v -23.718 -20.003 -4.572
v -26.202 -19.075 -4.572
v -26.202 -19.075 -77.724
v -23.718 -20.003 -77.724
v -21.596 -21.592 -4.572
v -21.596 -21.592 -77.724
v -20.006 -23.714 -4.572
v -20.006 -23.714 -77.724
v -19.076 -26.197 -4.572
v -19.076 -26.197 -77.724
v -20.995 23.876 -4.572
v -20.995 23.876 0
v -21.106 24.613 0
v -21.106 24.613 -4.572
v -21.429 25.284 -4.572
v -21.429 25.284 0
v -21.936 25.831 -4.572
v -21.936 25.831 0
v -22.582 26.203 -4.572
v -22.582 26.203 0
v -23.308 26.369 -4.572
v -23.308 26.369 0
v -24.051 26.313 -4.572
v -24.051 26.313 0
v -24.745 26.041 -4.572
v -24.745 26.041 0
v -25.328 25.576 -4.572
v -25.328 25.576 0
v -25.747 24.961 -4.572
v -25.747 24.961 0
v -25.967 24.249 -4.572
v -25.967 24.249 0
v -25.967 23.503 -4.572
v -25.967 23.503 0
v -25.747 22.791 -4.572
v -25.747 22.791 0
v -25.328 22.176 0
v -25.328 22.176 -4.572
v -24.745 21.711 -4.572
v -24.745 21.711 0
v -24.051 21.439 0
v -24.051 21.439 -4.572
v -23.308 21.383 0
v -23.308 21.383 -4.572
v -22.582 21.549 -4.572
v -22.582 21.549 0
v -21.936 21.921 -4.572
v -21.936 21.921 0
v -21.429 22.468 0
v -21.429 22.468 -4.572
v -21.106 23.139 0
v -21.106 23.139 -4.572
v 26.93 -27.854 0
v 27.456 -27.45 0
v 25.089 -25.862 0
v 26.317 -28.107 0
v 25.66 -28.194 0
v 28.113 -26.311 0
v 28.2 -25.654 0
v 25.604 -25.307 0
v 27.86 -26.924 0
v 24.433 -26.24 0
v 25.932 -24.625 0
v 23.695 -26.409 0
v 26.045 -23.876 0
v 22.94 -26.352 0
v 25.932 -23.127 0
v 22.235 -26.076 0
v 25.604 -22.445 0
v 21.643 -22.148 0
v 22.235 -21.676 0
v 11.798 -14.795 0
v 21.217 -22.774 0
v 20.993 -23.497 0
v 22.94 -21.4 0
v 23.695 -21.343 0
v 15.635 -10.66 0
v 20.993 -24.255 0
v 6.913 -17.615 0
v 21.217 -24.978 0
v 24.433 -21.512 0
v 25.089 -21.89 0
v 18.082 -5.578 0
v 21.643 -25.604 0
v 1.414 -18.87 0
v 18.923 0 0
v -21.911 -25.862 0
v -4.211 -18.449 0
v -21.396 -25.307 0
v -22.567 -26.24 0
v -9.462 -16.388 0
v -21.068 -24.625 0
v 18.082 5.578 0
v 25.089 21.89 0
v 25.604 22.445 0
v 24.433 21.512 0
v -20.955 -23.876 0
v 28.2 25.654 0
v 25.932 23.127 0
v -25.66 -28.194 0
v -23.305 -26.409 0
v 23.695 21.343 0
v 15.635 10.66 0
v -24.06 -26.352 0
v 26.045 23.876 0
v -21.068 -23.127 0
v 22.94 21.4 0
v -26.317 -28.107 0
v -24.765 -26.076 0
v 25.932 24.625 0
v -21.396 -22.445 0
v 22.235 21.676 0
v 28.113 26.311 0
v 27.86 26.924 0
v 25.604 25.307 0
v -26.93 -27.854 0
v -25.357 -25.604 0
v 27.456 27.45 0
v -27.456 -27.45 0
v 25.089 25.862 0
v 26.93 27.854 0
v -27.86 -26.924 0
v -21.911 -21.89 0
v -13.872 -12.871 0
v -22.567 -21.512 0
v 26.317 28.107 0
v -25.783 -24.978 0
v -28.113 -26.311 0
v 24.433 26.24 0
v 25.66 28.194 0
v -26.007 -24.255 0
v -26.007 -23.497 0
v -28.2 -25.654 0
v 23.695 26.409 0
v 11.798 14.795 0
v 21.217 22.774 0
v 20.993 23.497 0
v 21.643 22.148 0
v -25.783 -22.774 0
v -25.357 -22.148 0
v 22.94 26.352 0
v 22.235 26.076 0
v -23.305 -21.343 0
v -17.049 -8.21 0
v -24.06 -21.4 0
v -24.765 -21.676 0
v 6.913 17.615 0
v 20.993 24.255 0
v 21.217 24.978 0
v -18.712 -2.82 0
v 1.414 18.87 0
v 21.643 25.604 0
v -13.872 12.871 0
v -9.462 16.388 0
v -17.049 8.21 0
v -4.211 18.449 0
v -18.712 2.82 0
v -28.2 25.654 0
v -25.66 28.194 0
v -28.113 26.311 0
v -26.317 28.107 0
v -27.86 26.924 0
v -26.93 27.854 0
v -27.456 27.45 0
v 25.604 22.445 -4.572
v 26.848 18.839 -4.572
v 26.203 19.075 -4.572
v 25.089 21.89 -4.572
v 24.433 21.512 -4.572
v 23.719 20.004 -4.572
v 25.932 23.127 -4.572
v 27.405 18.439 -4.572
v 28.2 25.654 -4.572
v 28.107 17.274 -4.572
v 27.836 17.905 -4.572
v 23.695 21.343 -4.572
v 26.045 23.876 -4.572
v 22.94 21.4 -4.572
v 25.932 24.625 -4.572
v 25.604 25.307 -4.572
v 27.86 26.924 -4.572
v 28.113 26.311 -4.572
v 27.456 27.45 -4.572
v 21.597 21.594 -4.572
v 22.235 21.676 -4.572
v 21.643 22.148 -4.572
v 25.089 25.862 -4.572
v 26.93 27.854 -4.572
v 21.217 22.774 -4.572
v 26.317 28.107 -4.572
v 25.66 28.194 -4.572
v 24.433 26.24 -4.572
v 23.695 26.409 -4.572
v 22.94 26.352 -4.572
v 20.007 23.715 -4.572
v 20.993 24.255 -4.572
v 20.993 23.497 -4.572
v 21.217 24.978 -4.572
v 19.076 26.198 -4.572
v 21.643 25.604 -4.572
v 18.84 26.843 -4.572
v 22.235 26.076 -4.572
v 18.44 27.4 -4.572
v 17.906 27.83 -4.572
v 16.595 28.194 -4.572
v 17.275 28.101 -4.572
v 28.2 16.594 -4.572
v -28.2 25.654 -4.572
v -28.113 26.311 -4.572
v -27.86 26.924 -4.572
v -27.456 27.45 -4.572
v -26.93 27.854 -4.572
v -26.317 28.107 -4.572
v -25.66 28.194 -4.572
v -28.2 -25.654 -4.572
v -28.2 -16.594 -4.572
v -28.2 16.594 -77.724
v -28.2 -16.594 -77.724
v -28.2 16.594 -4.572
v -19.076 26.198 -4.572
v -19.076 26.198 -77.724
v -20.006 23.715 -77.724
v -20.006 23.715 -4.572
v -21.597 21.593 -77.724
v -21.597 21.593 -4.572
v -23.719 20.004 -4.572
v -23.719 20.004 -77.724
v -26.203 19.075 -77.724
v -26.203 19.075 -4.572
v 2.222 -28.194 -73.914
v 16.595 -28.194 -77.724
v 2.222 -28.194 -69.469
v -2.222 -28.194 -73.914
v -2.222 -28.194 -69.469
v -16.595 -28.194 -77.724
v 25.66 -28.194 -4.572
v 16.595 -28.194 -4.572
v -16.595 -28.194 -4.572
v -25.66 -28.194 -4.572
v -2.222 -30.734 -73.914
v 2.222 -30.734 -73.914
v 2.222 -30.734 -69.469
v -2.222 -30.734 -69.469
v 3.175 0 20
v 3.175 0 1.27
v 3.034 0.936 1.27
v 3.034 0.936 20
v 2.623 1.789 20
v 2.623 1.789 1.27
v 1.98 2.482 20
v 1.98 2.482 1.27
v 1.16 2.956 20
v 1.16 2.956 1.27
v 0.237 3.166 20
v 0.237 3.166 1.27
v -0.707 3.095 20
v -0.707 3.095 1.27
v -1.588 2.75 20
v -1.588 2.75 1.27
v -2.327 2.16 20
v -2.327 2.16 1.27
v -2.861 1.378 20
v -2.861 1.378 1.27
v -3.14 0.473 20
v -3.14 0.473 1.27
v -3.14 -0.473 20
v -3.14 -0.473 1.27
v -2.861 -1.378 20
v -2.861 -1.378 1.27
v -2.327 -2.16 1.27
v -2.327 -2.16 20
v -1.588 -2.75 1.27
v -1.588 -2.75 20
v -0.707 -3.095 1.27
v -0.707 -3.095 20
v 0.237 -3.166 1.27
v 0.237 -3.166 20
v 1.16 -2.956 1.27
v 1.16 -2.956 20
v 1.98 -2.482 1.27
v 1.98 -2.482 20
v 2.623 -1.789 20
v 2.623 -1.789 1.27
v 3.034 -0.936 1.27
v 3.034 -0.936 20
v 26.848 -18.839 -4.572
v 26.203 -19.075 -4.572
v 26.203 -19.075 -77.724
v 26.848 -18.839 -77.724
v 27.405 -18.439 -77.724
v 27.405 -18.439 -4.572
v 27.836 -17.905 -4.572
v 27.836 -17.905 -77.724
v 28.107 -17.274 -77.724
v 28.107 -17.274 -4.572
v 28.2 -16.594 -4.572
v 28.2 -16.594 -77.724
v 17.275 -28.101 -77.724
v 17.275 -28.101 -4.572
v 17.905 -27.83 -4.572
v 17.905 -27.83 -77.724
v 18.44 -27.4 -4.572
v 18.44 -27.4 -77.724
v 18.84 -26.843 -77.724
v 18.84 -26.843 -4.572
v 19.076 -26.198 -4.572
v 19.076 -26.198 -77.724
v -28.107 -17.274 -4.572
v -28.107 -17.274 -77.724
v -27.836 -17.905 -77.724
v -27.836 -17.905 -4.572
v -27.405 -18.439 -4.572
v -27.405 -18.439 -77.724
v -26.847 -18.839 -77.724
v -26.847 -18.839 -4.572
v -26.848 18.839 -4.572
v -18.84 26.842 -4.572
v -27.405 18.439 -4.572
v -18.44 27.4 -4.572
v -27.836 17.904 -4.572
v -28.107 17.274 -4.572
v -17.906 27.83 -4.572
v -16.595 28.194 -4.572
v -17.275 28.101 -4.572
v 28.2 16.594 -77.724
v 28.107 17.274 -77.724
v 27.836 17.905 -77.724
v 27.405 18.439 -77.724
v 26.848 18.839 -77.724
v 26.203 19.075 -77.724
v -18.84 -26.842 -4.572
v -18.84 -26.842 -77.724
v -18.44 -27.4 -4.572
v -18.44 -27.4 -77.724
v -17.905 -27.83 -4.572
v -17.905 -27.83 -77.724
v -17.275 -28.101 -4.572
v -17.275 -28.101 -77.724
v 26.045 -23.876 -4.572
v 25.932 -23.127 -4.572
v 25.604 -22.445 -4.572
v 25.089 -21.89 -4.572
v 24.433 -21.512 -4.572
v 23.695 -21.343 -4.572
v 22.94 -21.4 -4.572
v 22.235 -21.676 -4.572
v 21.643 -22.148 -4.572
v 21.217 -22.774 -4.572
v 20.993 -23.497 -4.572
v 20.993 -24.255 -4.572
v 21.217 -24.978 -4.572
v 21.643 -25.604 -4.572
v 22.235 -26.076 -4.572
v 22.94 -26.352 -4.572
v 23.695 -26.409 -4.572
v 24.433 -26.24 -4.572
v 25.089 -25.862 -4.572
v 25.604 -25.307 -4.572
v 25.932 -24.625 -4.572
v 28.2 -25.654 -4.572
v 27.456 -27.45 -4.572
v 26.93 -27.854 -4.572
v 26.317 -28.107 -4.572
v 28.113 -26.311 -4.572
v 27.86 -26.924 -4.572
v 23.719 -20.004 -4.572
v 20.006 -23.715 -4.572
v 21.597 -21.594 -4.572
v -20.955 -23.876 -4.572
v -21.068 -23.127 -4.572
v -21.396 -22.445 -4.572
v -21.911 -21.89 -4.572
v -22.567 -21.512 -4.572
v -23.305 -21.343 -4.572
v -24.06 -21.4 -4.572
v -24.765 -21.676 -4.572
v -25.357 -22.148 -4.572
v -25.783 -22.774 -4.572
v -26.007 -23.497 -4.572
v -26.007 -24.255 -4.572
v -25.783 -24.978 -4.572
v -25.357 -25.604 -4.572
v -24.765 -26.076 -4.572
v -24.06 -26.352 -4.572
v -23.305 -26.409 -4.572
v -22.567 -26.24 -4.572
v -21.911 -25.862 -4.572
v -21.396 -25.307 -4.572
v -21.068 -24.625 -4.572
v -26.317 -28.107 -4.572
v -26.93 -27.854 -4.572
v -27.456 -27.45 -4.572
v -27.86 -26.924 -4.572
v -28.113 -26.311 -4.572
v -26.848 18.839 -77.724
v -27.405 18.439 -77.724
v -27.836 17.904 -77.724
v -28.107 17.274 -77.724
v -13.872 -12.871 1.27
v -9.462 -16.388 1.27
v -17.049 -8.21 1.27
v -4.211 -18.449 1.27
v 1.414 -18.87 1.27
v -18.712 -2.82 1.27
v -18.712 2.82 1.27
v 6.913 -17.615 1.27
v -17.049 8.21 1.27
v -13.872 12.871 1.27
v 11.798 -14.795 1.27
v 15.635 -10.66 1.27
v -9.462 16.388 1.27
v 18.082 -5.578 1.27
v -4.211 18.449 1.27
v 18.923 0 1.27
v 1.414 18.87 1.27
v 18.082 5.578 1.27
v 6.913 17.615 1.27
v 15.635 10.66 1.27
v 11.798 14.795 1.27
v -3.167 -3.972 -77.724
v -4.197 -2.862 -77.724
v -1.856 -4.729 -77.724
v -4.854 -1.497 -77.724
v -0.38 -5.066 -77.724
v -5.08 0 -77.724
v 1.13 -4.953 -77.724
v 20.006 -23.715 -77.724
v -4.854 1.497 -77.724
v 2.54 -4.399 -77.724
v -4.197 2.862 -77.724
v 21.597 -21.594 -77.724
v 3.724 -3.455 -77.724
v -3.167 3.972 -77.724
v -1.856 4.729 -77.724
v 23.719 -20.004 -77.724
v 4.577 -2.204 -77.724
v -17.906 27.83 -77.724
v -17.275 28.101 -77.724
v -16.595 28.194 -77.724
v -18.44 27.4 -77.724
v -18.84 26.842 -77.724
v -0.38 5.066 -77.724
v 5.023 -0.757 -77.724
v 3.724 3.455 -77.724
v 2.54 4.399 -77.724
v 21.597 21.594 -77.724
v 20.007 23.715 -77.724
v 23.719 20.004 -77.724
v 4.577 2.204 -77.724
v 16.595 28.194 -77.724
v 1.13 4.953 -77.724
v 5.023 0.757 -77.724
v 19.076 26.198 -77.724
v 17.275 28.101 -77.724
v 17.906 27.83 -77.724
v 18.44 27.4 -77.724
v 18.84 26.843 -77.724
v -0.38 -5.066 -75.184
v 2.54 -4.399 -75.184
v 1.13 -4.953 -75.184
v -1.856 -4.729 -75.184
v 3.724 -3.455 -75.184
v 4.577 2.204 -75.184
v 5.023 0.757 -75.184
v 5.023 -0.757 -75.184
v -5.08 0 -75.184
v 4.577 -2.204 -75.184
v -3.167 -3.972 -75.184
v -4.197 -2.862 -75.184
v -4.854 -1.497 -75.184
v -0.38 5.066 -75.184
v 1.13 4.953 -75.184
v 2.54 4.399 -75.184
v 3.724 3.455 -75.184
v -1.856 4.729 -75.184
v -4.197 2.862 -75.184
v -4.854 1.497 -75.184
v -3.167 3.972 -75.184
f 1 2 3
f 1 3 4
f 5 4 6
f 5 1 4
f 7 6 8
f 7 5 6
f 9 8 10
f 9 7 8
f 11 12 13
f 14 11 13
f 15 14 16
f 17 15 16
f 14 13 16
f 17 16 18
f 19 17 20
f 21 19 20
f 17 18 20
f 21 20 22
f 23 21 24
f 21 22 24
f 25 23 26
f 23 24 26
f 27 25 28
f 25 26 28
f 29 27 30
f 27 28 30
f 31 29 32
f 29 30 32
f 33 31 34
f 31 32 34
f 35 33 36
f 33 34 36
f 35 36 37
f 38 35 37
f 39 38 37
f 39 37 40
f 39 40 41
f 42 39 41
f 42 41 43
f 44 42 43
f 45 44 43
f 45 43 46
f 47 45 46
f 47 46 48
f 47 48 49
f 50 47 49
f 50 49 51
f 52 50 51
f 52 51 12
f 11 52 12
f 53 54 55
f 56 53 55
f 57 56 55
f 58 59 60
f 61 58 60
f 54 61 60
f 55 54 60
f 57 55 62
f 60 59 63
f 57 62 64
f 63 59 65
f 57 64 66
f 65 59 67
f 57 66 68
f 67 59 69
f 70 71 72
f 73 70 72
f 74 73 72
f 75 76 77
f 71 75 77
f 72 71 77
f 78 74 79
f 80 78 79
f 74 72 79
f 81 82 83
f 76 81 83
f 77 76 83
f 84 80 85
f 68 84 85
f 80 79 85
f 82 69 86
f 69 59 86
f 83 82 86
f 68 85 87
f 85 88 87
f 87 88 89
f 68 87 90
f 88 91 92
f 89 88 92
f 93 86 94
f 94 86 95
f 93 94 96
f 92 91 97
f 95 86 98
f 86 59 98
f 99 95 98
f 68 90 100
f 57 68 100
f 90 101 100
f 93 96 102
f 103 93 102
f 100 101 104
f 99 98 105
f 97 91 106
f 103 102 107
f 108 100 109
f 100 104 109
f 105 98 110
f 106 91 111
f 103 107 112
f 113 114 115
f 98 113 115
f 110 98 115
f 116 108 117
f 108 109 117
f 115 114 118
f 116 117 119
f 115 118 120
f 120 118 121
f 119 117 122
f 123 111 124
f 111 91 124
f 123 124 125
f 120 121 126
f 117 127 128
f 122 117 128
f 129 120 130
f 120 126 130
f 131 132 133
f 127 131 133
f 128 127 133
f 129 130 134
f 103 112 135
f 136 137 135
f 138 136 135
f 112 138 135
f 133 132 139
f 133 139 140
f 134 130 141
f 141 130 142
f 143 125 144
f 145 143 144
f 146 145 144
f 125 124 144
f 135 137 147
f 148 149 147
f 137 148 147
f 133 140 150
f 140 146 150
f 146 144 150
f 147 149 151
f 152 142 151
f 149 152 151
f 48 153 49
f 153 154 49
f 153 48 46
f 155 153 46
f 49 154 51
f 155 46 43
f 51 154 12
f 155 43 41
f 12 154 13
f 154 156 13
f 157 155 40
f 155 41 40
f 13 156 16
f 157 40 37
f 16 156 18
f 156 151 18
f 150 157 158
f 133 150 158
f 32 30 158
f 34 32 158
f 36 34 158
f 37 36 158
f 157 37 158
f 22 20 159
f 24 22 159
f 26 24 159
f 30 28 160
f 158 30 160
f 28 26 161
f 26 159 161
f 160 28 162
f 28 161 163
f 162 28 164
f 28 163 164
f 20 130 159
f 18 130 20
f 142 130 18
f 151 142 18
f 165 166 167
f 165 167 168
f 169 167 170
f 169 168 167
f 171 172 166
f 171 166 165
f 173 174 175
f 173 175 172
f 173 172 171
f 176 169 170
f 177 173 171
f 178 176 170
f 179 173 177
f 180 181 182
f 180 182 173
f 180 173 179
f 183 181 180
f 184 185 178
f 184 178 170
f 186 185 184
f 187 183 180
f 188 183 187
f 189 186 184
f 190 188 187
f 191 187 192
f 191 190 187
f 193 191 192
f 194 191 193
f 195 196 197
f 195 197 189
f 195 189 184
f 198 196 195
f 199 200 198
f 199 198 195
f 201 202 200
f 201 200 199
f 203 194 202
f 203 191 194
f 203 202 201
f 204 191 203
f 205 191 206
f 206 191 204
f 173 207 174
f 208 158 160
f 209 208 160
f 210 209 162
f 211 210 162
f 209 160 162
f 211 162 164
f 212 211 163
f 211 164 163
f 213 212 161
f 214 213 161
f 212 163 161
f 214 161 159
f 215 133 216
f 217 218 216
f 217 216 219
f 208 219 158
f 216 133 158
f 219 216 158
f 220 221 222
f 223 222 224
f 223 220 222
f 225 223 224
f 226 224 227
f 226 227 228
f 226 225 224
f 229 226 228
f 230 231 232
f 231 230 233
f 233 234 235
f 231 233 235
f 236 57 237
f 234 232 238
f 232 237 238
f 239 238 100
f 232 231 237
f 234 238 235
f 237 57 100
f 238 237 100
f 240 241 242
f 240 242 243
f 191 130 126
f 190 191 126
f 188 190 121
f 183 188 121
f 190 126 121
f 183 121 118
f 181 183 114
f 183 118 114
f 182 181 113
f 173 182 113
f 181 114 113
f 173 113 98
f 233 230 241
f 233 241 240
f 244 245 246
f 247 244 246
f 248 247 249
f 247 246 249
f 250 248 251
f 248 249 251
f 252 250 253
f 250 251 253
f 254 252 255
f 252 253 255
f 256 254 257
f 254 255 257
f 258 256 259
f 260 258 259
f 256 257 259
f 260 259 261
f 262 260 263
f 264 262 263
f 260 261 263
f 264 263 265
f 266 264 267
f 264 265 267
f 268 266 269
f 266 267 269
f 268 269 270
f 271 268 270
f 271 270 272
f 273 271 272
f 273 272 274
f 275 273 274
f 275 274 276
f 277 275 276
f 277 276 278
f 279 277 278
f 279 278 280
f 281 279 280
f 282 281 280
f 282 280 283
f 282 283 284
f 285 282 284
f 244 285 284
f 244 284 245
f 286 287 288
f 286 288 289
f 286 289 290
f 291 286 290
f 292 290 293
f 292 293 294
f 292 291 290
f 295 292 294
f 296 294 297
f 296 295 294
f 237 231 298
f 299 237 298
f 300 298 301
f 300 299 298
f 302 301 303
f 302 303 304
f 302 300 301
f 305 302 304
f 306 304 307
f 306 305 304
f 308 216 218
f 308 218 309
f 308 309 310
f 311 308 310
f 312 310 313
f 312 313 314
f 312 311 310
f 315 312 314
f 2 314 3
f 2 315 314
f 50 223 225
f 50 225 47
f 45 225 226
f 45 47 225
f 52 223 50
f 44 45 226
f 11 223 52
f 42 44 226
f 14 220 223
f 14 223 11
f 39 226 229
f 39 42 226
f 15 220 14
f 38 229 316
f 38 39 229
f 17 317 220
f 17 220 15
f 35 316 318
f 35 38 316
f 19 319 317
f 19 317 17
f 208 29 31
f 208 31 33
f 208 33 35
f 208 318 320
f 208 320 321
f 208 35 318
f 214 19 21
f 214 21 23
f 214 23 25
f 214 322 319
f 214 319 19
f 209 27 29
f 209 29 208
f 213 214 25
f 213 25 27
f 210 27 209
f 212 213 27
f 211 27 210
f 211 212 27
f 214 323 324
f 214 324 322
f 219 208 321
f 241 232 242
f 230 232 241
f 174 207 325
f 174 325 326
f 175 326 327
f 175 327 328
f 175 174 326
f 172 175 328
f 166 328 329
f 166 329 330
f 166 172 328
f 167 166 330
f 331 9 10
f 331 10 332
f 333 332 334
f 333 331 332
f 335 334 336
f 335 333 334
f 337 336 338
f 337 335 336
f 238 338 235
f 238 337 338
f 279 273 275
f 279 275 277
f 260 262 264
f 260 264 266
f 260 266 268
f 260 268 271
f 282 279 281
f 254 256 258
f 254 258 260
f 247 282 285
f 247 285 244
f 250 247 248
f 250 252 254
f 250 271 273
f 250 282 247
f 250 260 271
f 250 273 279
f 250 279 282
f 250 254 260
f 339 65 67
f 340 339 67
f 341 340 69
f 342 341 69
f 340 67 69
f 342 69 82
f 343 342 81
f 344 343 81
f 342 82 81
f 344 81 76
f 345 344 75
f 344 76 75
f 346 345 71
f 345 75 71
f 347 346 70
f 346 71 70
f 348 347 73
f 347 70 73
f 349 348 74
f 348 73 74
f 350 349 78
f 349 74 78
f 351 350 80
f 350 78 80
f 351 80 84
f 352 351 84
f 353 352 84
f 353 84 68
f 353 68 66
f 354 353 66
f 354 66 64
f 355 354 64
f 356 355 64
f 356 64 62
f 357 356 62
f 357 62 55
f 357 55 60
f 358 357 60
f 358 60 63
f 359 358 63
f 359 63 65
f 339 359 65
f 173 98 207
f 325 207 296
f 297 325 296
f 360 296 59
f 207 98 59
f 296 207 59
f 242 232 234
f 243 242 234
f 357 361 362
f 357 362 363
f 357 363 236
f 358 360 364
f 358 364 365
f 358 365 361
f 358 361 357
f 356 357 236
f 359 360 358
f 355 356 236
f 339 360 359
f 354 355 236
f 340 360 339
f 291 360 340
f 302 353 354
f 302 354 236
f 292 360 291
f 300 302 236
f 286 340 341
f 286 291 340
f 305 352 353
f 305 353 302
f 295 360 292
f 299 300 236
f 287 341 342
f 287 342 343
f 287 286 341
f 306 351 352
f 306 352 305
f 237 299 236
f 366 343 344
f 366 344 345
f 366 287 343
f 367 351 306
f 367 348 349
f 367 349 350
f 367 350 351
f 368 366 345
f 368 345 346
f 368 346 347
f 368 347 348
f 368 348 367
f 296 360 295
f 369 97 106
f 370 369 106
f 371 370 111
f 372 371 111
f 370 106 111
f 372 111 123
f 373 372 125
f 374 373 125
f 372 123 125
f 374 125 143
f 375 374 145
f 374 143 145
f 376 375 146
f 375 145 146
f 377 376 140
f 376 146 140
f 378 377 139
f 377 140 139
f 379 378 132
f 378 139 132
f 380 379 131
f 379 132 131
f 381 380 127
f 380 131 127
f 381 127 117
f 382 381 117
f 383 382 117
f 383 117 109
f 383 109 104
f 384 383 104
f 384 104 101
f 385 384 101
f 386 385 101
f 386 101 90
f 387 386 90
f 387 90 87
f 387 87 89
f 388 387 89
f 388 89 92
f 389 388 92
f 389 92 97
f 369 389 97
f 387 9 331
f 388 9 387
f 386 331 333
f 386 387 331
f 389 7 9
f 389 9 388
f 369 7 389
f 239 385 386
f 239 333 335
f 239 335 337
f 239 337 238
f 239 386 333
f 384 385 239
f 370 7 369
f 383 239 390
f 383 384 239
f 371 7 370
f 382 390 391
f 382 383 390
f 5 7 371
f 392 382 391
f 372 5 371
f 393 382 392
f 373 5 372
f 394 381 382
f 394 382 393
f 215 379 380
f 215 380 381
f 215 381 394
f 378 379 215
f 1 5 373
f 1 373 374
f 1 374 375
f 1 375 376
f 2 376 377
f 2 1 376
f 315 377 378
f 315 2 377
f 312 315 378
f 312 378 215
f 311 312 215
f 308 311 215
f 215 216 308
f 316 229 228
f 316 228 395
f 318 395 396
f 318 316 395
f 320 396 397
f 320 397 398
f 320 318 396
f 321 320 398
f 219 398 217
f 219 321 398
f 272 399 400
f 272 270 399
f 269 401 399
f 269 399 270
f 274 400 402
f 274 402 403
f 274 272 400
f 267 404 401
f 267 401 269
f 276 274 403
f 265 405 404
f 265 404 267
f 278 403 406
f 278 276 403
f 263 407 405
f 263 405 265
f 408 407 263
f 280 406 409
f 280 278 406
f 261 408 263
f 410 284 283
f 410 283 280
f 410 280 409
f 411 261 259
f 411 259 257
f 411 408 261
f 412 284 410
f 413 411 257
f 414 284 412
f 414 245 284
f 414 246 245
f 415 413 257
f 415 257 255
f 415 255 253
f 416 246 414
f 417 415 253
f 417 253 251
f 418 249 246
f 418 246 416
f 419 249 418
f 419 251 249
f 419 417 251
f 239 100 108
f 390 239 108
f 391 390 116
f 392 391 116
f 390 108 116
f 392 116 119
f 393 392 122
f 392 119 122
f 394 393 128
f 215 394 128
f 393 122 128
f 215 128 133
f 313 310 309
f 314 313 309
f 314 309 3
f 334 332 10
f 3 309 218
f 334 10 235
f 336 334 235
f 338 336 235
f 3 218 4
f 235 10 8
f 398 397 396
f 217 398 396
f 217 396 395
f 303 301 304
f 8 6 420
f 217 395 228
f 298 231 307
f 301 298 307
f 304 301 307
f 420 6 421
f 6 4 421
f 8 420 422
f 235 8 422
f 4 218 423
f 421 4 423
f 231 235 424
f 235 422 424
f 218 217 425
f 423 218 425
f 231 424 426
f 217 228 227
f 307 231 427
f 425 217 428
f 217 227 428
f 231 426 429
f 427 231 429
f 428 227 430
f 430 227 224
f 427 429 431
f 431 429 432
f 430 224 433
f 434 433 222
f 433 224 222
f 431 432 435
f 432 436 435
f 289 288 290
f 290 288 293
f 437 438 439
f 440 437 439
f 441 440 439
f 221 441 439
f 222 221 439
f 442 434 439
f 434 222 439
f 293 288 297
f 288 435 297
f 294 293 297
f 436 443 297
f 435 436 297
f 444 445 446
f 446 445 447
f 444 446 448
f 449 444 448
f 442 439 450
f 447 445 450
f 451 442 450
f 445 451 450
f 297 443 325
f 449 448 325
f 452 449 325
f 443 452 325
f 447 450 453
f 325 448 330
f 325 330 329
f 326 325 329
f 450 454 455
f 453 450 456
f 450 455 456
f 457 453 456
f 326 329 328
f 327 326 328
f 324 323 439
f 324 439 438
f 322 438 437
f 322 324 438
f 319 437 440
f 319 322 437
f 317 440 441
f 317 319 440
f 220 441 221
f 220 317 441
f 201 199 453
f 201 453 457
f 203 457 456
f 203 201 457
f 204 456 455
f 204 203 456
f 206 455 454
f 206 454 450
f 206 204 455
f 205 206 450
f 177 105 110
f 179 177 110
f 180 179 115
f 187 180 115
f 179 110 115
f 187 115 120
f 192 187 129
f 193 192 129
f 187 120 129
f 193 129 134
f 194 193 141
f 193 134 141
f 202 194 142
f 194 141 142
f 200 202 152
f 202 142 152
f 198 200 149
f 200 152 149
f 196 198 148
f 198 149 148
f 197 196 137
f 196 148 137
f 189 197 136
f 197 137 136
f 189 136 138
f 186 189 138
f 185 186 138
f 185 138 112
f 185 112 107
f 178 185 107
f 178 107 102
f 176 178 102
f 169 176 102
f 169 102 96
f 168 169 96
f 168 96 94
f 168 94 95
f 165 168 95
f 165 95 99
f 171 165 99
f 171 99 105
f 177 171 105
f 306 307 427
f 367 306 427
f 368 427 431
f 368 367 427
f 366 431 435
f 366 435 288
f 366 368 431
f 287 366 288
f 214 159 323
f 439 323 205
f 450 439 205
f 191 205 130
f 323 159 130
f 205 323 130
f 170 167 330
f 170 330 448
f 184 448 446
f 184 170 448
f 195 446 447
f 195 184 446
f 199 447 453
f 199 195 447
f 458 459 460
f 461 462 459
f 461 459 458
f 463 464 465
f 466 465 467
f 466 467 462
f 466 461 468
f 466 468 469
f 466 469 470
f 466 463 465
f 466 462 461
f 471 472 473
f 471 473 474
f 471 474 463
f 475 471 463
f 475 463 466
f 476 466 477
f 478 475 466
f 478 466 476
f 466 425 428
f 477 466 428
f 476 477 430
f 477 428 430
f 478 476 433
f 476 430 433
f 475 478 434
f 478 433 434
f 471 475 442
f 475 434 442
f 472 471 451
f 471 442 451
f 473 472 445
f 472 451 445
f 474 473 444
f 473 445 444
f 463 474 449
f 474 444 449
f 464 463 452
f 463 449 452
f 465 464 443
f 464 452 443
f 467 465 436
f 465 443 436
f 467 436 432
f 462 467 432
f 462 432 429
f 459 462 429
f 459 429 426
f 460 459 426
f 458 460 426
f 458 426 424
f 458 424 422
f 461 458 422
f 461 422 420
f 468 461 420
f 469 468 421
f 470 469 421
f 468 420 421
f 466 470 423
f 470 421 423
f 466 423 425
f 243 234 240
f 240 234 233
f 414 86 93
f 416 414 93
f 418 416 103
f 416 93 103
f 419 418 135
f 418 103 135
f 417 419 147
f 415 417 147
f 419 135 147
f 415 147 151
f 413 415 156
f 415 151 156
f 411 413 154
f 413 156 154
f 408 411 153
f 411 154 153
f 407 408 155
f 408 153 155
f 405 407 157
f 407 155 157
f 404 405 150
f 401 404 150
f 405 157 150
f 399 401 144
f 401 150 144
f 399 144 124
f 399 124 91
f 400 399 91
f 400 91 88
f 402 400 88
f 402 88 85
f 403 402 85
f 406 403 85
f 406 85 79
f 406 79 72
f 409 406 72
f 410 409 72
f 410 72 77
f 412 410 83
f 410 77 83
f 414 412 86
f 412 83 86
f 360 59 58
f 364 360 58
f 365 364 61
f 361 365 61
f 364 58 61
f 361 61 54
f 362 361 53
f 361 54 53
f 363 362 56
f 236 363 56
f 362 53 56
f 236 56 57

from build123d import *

# Parameters (mm, degrees)
BOSS_EXTRUDE1_DEPTH = 4.572
SKETCH2_R           = 2.5
SKETCH2_R_2         = 2.54
CUT_EXTRUDE1_DEPTH  = 12.7
SKETCH3_R           = 3.175
BOSS_EXTRUDE2_DEPTH = 20
BOSS_EXTRUDE3_DEPTH = 73.152
SKETCH7_R           = 5.08
CUT_EXTRUDE2_DEPTH  = 2.54
SKETCH8_W           = 4.445
SKETCH8_H           = 4.445
BOSS_EXTRUDE4_DEPTH = 2.54
SKETCH9_R           = 18.923
BOSS_EXTRUDE5_DEPTH = 1.27


with BuildPart() as part:
    # Sketch1 → Boss-Extrude1 (new body)
    with BuildSketch(Plane.XY):
        with BuildLine():
            Line((-25.66, 28.194), (25.66, 28.194))
            ThreePointArc((25.66, 28.194), (27.456051224, 27.450051224), (28.2, 25.654))
            Line((28.2, 25.654), (28.2, -25.654))
            ThreePointArc((28.2, -25.654), (27.456051224, -27.450051224), (25.66, -28.194))
            Line((25.66, -28.194), (-25.66, -28.194))
            ThreePointArc((-25.66, -28.194), (-27.456051224, -27.450051224), (-28.2, -25.654))
            Line((-28.2, -25.654), (-28.2, 25.654))
            ThreePointArc((-28.2, 25.654), (-27.456051224, 27.450051224), (-25.66, 28.194))
        make_face()
    extrude(amount=-BOSS_EXTRUDE1_DEPTH)

    # Sketch2 → Cut-Extrude1 (cut)
    with BuildSketch(Plane.XY):
        with Locations((-23.495, 23.876)):
            Circle(SKETCH2_R)
        with Locations((23.505, 23.876)):
            Circle(SKETCH2_R_2)
        with Locations((-23.495, -23.876)):
            Circle(SKETCH2_R_2)
        with Locations((23.505, -23.876)):
            Circle(SKETCH2_R_2)
    extrude(amount=-CUT_EXTRUDE1_DEPTH, mode=Mode.SUBTRACT)

    # Sketch3 → Boss-Extrude2 (add)
    with BuildSketch(Plane.XY):
        Circle(SKETCH3_R)
    extrude(amount=BOSS_EXTRUDE2_DEPTH)

    # Sketch6 → Boss-Extrude3 (add)
    with BuildSketch(Plane(origin=(0, 0, -4.572), x_dir=(-1, 0, 0), z_dir=(0, 0, -1))):
        with BuildLine():
            Line((-16.59544611, 28.194), (16.59544611, 28.194))
            ThreePointArc((16.59544611, 28.194), (18.187513991, 27.633120982), (19.076465755, 26.198188868))
            ThreePointArc((19.076465755, 26.198188868), (21.596845623, 21.593151837), (26.203044563, 19.07489608))
            ThreePointArc((26.203044563, 19.07489608), (27.638753799, 18.186149944), (28.2, 16.59362572))
            Line((28.2, 16.59362572), (28.2, -16.59362572))
            ThreePointArc((28.2, -16.59362572), (27.638442141, -18.186537109), (26.202073469, -19.075108412))
            ThreePointArc((26.202073469, -19.075108412), (21.595673614, -21.592228782), (19.076199379, -26.19734161))
            ThreePointArc((19.076199379, -26.19734161), (18.187399824, -27.632849121), (16.594994048, -28.194))
            Line((16.594994048, -28.194), (-16.594994048, -28.194))
            ThreePointArc((-16.594994048, -28.194), (-18.18696432, -27.633199499), (-19.075960003, -26.198433587))
            ThreePointArc((-19.075960003, -26.198433587), (-21.596706334, -21.593572144), (-26.203011658, -19.07546527))
            ThreePointArc((-26.203011658, -19.07546527), (-27.638743239, -18.186725052), (-28.2, -16.594187708))
            Line((-28.2, -16.594187708), (-28.2, 16.594187708))
            ThreePointArc((-28.2, 16.594187708), (-27.638751536, 18.186714743), (-26.203037512, 19.075459612))
            ThreePointArc((-26.203037512, 19.075459612), (-21.596941467, 21.593557838), (-19.076433541, 26.198335711))
            ThreePointArc((-19.076433541, 26.198335711), (-18.187455421, 27.633168096), (-16.59544611, 28.194))
        make_face()
    extrude(amount=BOSS_EXTRUDE3_DEPTH)

    # Sketch7 → Cut-Extrude2 (cut)
    with BuildSketch(Plane(origin=(0, 0, -77.724), x_dir=(-1, 0, 0), z_dir=(0, 0, -1))):
        Circle(SKETCH7_R)
    extrude(amount=-CUT_EXTRUDE2_DEPTH, mode=Mode.SUBTRACT)

    # Sketch8 → Boss-Extrude4 (add)
    with BuildSketch(Plane(origin=(0, -28.194, 0), x_dir=(-1, 0, 0), z_dir=(0, -1, 0))):
        with Locations((0, 71.6915)):
            Rectangle(SKETCH8_W, SKETCH8_H)
    extrude(amount=BOSS_EXTRUDE4_DEPTH)

    # Sketch9 → Boss-Extrude5 (add)
    with BuildSketch(Plane.XY):
        Circle(SKETCH9_R)
    extrude(amount=BOSS_EXTRUDE5_DEPTH)


solid = part.part
